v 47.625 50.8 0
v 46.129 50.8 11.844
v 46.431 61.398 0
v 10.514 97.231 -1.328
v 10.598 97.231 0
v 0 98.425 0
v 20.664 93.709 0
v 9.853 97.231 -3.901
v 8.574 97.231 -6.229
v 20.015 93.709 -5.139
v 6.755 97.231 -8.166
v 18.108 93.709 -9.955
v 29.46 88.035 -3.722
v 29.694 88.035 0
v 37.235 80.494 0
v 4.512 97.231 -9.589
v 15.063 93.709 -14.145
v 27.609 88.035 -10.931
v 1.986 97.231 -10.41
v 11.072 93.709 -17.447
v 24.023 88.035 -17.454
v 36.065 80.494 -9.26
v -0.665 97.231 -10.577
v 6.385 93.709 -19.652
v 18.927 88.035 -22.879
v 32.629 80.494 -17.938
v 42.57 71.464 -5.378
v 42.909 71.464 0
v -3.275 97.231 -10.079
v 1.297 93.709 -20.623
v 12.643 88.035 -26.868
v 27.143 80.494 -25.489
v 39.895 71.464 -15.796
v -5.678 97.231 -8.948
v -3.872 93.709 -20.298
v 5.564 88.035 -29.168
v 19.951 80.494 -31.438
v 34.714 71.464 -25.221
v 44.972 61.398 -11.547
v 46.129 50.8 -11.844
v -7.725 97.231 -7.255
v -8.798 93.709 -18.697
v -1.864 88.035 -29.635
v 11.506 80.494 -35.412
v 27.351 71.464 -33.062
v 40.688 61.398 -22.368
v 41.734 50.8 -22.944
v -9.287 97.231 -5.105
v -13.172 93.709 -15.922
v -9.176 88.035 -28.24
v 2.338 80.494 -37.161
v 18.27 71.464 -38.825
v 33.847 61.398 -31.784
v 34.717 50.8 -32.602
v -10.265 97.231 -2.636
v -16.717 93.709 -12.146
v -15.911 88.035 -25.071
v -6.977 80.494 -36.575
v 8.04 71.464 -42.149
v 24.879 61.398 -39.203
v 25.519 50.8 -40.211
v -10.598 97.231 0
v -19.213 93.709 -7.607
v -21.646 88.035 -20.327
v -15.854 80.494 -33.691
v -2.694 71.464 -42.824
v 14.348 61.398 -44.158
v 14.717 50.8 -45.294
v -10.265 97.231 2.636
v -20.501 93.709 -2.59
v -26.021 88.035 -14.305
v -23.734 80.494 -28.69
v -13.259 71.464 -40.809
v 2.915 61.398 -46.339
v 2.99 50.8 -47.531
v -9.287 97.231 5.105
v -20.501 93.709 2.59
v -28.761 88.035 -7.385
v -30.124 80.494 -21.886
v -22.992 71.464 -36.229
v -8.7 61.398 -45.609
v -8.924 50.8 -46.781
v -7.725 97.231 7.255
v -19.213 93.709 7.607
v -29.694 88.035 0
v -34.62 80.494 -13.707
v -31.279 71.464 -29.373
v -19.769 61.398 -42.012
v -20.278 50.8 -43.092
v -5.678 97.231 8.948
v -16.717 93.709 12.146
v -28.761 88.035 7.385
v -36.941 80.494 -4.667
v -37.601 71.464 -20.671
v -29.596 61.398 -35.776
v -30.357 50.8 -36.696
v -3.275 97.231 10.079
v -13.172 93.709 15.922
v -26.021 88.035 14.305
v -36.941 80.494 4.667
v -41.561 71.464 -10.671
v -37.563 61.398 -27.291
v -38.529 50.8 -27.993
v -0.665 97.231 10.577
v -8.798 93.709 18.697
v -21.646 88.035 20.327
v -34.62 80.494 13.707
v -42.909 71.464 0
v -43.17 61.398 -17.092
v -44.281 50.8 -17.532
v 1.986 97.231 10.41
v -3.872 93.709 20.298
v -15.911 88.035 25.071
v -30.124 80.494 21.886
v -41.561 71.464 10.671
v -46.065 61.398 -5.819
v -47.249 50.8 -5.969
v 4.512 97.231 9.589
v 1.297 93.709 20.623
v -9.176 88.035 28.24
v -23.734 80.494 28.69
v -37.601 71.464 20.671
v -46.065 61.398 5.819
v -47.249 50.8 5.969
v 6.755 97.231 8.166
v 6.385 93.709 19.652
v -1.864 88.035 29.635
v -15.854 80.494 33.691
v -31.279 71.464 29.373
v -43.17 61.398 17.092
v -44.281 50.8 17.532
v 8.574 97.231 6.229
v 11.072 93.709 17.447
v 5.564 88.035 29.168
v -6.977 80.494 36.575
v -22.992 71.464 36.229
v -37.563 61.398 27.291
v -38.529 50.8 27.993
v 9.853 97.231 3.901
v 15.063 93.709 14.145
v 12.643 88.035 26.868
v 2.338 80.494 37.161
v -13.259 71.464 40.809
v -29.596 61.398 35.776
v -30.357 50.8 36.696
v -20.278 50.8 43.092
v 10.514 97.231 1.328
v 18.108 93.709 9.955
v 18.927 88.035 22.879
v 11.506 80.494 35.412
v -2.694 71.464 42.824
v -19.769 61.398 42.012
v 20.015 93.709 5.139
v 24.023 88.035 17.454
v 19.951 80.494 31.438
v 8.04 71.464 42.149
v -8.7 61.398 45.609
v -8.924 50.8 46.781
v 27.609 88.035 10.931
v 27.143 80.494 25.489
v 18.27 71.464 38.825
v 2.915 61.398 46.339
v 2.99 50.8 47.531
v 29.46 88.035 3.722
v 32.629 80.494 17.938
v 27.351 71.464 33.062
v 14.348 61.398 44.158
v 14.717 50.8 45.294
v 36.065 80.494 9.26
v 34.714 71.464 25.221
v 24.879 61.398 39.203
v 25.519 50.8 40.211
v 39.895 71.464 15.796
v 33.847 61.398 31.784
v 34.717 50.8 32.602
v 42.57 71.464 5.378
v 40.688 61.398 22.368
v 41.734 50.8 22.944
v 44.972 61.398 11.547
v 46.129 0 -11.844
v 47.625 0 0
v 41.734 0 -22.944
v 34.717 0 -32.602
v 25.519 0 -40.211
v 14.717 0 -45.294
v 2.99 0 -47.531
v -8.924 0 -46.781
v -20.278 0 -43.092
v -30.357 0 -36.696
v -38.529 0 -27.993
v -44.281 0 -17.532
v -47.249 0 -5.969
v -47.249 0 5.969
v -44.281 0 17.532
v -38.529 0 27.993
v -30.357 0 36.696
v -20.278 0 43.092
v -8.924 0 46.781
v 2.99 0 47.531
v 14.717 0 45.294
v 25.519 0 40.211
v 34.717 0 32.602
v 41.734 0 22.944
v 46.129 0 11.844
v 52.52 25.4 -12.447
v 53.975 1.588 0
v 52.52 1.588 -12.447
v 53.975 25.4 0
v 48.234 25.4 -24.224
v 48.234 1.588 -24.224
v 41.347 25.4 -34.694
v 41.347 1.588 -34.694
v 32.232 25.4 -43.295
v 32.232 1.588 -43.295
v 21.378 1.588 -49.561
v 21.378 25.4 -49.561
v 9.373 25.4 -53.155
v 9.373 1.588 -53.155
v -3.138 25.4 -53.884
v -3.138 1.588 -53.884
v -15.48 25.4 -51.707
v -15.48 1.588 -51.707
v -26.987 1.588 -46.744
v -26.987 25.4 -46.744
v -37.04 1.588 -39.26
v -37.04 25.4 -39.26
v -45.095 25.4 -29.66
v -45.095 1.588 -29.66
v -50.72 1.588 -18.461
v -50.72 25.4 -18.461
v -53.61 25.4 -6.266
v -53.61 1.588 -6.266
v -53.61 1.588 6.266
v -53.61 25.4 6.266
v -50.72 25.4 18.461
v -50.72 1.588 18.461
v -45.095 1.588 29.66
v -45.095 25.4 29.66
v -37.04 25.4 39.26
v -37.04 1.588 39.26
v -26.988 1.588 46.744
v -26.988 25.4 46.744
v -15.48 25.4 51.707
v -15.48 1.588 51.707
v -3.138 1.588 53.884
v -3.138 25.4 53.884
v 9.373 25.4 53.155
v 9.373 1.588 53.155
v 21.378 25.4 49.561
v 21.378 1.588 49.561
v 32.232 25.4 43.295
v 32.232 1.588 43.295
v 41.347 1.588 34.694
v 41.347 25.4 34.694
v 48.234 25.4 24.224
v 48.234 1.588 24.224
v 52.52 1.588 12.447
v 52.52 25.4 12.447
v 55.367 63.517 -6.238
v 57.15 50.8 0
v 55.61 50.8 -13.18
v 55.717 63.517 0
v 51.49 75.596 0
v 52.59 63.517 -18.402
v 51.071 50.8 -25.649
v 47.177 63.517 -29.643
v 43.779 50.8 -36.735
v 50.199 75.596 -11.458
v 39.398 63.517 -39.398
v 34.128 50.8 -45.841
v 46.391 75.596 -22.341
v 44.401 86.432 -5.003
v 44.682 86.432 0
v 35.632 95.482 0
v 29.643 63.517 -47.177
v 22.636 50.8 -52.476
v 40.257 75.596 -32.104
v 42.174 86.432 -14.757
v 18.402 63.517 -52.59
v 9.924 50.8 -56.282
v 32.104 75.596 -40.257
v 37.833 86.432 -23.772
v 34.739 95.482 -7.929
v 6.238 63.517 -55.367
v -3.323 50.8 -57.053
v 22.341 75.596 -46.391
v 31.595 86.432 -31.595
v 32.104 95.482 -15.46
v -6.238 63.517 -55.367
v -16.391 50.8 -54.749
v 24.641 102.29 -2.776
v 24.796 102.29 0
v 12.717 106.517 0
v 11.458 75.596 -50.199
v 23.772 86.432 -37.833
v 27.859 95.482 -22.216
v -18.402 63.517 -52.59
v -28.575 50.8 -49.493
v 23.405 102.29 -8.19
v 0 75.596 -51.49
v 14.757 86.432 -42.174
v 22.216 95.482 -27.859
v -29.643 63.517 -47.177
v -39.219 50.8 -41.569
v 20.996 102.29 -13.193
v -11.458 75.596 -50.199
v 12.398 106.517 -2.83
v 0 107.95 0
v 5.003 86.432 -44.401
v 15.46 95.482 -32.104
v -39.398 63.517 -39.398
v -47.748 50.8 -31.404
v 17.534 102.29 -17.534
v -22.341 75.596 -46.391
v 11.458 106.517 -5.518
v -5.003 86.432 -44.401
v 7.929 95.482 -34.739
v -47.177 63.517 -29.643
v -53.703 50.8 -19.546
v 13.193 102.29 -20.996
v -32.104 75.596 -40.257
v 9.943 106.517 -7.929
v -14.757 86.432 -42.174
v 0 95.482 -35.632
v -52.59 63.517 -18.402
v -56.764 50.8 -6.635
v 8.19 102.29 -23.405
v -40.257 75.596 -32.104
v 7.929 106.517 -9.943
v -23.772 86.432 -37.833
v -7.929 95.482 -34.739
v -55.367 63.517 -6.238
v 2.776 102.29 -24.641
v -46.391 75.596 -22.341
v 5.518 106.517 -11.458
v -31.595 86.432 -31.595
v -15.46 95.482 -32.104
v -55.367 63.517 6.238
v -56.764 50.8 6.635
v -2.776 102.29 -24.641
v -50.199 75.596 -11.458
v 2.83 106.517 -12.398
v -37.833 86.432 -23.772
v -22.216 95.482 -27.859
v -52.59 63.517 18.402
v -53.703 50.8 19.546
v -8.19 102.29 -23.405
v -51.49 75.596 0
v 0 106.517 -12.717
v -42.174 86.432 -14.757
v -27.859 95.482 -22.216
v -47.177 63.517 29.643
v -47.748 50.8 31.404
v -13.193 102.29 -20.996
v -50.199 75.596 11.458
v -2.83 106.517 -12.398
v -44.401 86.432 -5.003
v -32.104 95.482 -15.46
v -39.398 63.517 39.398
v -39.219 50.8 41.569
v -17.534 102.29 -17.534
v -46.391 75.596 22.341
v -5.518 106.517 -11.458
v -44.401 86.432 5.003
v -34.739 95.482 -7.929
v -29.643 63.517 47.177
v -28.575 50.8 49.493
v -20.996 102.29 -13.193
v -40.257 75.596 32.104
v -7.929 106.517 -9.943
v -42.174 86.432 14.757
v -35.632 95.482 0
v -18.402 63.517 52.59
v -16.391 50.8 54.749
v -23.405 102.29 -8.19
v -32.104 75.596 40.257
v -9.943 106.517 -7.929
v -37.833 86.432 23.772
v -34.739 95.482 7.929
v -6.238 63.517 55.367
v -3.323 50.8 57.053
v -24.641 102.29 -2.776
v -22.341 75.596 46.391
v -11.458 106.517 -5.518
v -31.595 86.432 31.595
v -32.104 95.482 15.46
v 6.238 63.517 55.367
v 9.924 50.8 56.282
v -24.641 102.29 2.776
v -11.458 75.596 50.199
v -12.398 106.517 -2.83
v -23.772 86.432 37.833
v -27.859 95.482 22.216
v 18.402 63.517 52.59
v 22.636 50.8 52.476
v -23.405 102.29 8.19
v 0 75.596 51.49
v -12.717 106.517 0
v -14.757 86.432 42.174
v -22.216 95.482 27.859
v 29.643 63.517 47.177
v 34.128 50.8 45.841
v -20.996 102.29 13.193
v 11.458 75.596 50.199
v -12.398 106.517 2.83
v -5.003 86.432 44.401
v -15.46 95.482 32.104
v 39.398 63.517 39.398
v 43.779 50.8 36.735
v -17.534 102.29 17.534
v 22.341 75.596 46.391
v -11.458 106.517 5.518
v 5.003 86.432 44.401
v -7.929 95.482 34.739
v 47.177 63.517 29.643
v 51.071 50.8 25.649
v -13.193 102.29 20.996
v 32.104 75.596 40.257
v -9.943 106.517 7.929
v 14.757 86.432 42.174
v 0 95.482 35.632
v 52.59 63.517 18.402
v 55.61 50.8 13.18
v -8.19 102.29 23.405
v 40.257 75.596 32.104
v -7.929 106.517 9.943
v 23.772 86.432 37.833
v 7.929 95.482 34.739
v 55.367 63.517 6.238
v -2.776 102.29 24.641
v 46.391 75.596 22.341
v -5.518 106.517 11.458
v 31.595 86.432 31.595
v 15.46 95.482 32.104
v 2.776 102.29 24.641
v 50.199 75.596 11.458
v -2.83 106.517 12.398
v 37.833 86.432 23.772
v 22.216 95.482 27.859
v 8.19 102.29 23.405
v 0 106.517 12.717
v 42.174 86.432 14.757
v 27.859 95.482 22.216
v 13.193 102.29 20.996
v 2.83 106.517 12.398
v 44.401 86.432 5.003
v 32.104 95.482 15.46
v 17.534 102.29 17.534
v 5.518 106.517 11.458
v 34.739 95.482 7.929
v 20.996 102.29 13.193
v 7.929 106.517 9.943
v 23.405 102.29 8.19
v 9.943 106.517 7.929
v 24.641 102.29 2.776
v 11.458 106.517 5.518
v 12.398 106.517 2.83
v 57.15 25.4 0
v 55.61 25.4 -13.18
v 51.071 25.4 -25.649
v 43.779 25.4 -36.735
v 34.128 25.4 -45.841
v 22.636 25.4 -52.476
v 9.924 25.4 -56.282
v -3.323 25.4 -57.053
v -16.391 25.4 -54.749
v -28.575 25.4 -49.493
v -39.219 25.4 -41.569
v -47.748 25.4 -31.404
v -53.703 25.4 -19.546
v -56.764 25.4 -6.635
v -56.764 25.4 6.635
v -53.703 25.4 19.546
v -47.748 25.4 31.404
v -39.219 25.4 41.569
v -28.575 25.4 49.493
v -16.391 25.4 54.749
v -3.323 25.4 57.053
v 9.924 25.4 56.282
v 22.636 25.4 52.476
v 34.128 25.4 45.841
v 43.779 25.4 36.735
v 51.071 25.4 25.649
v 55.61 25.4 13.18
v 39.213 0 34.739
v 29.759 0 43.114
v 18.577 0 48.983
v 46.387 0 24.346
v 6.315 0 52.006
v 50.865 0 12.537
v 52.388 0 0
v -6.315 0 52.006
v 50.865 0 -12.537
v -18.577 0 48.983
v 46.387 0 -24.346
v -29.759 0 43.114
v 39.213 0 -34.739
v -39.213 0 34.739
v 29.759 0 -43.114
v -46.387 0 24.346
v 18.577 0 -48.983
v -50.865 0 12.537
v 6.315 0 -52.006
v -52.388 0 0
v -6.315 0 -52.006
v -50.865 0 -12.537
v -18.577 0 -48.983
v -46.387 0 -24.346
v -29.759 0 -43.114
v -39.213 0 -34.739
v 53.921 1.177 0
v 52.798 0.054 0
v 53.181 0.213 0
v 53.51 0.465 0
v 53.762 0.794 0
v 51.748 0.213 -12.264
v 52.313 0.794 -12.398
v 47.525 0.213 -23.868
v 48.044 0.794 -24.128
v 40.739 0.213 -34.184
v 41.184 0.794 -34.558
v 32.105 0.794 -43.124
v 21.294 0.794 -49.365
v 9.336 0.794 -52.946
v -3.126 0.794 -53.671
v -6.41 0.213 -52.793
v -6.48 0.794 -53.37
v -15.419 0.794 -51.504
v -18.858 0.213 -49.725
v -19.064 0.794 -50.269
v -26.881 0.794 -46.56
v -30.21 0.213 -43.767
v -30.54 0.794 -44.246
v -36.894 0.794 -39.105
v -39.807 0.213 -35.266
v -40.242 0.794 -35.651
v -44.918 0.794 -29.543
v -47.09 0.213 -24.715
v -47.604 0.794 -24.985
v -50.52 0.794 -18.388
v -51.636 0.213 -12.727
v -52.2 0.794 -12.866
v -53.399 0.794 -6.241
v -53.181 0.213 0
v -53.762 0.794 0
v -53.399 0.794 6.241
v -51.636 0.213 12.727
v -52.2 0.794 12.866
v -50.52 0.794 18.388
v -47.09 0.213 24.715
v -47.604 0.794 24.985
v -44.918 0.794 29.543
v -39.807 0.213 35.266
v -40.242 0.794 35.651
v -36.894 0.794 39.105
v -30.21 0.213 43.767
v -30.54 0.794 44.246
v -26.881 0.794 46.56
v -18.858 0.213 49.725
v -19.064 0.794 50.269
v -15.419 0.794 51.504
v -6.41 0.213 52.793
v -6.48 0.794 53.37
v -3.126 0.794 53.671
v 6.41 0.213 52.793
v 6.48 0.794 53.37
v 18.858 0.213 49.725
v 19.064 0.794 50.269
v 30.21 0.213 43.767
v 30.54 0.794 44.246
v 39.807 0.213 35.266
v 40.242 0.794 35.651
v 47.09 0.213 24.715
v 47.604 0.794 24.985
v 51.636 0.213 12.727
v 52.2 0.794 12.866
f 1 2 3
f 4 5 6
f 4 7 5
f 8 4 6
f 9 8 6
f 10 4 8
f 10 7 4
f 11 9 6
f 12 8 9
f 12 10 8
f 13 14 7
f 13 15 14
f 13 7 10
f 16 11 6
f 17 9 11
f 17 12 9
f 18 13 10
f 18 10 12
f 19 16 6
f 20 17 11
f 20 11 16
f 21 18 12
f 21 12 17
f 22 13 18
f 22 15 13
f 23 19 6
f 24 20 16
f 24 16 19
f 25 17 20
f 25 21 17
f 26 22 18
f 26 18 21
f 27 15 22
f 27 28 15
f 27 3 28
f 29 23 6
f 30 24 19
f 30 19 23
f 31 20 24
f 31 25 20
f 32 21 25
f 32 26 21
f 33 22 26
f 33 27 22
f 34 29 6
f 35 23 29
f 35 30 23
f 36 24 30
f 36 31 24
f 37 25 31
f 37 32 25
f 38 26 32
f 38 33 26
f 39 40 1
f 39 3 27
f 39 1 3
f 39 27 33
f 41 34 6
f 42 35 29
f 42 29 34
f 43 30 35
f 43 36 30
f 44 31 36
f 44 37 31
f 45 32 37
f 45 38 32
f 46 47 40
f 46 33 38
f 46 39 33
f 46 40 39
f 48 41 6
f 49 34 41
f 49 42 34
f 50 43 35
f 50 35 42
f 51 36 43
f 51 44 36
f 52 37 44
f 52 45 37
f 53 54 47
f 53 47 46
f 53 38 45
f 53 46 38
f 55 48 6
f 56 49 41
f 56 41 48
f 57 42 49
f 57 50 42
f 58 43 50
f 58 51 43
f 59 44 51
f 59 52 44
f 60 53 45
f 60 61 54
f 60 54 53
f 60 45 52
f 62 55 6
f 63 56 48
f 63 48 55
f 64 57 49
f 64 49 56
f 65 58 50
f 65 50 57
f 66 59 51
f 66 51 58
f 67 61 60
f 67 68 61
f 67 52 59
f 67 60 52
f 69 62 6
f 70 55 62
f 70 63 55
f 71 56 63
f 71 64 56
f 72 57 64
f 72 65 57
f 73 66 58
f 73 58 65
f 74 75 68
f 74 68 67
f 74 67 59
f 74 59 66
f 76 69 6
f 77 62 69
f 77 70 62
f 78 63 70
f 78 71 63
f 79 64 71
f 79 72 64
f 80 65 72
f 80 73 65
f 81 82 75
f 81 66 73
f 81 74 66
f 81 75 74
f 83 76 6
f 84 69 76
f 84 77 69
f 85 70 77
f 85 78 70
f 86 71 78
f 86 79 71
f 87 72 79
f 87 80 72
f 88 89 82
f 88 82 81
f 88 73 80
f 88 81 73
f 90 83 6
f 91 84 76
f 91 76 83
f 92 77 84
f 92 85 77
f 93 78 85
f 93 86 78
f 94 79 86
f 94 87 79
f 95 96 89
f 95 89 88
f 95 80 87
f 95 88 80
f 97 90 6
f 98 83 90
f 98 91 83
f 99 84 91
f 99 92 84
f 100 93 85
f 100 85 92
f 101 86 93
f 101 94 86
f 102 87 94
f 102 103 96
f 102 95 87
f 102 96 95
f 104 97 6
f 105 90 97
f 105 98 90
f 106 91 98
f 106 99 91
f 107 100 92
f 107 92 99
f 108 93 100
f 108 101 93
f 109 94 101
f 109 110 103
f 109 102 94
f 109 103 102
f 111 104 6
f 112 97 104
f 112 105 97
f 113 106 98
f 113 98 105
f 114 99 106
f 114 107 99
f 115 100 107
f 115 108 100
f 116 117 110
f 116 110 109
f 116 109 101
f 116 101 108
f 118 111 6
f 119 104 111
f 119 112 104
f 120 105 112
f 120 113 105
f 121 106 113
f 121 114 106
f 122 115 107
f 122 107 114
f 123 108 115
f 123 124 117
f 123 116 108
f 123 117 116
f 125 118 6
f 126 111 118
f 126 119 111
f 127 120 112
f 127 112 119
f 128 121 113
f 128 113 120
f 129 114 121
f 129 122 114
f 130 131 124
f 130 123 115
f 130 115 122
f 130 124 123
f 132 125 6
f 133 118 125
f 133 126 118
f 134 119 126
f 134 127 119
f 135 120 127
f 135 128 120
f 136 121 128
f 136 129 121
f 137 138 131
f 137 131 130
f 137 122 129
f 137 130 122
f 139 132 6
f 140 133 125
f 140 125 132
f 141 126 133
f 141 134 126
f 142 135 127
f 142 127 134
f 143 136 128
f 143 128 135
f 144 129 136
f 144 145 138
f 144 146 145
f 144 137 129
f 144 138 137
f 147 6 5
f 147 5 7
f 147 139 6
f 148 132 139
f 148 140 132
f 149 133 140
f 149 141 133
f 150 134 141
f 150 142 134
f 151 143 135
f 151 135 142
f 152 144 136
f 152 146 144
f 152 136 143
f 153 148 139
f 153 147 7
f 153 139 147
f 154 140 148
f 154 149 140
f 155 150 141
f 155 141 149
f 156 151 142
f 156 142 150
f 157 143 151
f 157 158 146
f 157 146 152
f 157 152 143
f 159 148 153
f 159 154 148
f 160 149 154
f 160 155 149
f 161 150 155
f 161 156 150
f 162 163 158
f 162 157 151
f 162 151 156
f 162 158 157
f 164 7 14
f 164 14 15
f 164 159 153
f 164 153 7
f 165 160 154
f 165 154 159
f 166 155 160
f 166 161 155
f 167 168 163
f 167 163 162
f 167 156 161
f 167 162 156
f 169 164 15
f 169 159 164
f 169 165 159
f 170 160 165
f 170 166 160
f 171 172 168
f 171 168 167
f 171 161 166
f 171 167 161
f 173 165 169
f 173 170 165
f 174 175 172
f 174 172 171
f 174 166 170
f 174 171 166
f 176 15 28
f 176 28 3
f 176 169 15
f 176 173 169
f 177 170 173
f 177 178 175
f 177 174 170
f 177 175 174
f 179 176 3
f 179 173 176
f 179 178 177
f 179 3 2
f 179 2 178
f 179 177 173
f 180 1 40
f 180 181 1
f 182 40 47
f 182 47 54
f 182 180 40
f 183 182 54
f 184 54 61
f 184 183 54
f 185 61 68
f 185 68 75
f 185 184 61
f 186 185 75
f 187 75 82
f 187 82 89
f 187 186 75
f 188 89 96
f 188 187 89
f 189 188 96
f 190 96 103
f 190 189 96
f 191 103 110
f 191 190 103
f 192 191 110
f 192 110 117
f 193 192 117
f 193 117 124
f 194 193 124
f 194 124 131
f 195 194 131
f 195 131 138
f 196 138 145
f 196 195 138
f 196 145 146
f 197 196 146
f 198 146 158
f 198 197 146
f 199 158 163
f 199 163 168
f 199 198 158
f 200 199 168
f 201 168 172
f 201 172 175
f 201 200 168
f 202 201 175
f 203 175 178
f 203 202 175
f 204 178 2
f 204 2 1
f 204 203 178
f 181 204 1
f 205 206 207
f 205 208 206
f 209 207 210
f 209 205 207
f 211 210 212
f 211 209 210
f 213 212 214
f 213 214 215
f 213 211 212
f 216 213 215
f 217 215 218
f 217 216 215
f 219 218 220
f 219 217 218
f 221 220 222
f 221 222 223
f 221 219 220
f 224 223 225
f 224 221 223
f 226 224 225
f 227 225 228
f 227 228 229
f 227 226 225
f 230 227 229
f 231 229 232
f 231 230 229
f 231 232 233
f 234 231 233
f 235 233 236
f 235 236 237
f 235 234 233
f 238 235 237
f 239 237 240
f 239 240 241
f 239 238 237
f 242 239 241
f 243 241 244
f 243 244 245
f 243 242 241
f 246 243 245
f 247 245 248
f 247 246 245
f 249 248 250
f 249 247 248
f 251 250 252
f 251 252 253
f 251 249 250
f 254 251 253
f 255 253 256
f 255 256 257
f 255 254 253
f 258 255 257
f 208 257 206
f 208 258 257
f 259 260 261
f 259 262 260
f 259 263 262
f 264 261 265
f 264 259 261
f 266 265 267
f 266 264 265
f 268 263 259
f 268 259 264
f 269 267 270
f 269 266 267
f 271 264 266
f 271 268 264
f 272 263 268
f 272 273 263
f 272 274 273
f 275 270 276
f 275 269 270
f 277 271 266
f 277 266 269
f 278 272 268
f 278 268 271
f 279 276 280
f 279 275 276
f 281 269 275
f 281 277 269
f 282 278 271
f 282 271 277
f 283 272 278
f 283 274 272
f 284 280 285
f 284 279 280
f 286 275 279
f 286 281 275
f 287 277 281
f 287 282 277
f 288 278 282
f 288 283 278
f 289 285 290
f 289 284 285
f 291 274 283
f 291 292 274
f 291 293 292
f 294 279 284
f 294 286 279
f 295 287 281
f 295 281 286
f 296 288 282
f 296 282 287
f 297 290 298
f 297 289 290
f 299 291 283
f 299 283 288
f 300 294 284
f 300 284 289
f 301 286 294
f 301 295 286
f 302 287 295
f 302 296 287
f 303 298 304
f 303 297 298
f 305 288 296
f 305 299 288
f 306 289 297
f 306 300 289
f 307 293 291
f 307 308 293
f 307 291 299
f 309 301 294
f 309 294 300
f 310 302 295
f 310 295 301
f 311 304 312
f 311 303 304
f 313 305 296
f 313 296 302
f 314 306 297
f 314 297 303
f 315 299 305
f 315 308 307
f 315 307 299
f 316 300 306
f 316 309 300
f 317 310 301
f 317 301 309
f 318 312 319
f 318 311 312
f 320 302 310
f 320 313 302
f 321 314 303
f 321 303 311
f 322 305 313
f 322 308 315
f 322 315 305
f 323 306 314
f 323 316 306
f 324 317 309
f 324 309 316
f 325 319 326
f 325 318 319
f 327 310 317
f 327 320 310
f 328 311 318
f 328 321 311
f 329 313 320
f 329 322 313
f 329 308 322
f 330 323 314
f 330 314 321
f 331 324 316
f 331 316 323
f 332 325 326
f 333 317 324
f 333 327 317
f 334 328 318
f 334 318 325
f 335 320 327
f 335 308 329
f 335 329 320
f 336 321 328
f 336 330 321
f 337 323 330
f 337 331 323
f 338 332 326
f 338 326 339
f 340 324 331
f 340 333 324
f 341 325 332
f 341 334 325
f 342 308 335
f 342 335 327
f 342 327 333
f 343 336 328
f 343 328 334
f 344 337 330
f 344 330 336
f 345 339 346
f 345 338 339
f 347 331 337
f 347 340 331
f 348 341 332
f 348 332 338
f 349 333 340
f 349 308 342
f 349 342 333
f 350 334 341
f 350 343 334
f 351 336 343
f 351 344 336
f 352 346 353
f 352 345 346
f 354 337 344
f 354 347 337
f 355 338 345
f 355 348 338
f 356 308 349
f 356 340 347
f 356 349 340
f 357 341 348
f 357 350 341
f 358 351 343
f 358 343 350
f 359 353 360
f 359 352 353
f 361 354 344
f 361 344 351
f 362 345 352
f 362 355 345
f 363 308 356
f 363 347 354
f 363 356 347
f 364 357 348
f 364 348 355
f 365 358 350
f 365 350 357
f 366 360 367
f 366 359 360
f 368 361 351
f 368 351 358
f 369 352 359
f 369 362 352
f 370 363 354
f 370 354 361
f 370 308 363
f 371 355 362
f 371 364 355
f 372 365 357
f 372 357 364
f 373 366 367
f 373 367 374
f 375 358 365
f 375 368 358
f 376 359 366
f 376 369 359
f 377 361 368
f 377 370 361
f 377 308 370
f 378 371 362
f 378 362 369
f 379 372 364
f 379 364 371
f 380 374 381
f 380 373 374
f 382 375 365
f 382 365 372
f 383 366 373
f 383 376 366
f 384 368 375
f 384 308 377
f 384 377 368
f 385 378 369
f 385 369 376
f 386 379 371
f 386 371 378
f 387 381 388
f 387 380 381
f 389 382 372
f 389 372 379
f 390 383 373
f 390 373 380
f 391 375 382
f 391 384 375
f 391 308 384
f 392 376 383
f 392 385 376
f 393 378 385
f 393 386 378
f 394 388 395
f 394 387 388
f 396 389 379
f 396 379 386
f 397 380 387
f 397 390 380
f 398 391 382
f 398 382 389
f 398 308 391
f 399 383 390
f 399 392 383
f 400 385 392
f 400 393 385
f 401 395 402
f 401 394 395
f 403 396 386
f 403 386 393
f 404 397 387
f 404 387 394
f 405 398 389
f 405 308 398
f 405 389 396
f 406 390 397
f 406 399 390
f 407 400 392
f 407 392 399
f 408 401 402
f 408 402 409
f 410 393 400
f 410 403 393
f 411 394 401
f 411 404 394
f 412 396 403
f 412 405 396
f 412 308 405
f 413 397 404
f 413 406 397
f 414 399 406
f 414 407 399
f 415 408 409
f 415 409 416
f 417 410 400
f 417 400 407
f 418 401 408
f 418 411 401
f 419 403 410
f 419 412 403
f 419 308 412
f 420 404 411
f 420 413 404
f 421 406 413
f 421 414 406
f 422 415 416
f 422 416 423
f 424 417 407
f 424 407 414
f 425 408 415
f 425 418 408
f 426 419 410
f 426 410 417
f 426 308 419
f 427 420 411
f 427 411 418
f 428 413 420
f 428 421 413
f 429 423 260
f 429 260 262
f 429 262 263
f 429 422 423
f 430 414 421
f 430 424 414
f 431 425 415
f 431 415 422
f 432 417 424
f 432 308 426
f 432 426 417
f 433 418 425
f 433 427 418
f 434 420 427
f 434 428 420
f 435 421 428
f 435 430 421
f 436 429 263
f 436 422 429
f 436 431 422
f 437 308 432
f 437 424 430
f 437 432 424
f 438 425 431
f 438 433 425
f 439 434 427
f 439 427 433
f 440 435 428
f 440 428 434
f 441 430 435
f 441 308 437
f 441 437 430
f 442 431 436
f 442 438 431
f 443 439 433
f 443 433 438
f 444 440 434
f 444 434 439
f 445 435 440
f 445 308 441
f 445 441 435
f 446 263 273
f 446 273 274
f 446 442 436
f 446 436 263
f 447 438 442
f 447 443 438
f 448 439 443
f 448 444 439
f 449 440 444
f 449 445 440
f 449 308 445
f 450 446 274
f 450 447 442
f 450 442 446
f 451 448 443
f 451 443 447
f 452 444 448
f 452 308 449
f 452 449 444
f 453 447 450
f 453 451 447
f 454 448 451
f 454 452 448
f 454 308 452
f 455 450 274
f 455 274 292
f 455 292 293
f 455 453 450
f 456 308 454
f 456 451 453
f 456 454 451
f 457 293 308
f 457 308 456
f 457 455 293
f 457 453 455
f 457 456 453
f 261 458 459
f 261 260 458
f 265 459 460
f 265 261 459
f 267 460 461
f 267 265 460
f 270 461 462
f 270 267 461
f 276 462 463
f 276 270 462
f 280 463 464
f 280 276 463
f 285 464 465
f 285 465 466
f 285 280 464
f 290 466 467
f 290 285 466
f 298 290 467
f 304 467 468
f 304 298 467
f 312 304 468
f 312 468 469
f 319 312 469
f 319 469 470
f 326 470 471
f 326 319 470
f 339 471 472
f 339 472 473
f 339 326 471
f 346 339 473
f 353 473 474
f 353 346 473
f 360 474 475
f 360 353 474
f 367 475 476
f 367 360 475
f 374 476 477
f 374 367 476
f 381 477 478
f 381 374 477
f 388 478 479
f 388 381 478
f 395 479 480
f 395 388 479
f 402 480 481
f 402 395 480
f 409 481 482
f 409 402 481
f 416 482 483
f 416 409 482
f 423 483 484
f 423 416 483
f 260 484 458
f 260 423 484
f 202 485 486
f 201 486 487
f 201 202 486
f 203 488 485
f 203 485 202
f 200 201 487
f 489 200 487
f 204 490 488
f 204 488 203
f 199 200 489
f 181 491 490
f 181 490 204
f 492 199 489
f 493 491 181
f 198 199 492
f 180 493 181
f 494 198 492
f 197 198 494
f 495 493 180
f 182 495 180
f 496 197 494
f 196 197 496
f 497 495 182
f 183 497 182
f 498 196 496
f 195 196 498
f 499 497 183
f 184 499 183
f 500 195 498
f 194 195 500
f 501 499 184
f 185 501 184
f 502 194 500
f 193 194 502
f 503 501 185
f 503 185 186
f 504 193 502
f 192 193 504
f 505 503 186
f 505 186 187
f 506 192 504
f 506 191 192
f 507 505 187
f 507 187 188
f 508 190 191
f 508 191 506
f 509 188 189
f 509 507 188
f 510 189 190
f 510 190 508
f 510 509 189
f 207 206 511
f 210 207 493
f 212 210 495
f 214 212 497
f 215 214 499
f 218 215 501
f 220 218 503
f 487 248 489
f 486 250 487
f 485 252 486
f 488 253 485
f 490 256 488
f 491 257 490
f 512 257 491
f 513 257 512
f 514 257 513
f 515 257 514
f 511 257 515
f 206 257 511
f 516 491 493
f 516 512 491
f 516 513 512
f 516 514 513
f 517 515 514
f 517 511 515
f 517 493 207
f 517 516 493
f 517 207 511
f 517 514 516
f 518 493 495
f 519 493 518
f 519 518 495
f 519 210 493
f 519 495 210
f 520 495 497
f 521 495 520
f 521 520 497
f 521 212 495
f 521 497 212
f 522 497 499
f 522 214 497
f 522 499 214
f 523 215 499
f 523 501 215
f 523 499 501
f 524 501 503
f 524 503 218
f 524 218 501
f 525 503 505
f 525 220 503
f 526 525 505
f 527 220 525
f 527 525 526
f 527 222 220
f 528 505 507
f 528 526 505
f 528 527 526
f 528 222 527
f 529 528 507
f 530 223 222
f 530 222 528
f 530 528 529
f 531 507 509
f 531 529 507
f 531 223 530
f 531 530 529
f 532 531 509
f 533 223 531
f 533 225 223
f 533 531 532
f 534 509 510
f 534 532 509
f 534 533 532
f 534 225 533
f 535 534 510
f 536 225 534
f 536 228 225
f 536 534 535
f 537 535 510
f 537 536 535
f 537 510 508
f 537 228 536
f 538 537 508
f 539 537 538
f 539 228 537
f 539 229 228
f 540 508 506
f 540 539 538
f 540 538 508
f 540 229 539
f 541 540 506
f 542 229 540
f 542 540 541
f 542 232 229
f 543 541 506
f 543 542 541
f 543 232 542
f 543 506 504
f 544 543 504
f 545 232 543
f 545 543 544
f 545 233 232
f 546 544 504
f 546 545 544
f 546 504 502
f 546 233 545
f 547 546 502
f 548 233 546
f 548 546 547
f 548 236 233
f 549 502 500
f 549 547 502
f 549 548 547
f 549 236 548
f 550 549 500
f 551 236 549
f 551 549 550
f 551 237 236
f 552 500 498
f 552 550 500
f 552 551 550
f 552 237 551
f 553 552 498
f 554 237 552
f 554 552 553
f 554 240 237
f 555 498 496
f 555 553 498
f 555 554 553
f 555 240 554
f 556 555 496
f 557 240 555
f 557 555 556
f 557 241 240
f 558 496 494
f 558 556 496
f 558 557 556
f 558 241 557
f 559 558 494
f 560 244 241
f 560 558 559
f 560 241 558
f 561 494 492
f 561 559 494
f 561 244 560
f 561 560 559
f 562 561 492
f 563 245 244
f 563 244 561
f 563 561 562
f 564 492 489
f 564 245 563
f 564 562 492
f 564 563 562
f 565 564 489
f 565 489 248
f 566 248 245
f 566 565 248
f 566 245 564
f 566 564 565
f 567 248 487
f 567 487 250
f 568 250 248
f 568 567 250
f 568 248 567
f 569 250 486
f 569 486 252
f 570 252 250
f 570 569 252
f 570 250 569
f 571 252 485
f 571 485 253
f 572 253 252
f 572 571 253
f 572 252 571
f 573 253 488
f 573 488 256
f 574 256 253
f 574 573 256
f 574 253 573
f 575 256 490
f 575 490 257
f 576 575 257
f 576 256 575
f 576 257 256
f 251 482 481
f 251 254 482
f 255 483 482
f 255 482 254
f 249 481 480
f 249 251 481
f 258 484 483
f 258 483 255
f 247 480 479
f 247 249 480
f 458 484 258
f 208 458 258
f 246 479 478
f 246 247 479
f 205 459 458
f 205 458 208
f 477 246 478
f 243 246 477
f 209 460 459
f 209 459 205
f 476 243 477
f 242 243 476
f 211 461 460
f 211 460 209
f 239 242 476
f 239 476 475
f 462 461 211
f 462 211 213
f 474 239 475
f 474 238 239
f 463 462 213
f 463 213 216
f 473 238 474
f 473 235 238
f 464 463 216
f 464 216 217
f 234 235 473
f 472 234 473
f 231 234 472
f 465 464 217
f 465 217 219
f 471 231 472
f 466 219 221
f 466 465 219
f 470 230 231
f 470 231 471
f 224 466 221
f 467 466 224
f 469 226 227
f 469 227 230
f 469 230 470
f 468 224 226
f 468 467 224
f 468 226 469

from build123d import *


with BuildPart() as part:
    # Sketch2 → Revolve1 (revolve)
    with BuildSketch(Plane.XY):
        with BuildLine():
            Line((47.625, 0), (52.3875, 0))
            ThreePointArc((52.3875, 0), (53.510032015, 0.464967985), (53.975, 1.5875))
            Line((53.975, 1.5875), (53.975, 25.4))
            Line((53.975, 25.4), (57.15, 25.4))
            Line((57.15, 25.4), (57.15, 50.8))
            ThreePointArc((57.15, 50.8), (40.411152545, 91.211152545), (0, 107.95))
            Line((0, 107.95), (0, 98.425))
            ThreePointArc((0, 98.425), (33.675960454, 84.475960454), (47.625, 50.8))
            Line((47.625, 50.8), (47.625, 0))
        make_face()
    revolve(axis=Axis((0, 98.425, 0), (0, 1, 0)))


solid = part.part
